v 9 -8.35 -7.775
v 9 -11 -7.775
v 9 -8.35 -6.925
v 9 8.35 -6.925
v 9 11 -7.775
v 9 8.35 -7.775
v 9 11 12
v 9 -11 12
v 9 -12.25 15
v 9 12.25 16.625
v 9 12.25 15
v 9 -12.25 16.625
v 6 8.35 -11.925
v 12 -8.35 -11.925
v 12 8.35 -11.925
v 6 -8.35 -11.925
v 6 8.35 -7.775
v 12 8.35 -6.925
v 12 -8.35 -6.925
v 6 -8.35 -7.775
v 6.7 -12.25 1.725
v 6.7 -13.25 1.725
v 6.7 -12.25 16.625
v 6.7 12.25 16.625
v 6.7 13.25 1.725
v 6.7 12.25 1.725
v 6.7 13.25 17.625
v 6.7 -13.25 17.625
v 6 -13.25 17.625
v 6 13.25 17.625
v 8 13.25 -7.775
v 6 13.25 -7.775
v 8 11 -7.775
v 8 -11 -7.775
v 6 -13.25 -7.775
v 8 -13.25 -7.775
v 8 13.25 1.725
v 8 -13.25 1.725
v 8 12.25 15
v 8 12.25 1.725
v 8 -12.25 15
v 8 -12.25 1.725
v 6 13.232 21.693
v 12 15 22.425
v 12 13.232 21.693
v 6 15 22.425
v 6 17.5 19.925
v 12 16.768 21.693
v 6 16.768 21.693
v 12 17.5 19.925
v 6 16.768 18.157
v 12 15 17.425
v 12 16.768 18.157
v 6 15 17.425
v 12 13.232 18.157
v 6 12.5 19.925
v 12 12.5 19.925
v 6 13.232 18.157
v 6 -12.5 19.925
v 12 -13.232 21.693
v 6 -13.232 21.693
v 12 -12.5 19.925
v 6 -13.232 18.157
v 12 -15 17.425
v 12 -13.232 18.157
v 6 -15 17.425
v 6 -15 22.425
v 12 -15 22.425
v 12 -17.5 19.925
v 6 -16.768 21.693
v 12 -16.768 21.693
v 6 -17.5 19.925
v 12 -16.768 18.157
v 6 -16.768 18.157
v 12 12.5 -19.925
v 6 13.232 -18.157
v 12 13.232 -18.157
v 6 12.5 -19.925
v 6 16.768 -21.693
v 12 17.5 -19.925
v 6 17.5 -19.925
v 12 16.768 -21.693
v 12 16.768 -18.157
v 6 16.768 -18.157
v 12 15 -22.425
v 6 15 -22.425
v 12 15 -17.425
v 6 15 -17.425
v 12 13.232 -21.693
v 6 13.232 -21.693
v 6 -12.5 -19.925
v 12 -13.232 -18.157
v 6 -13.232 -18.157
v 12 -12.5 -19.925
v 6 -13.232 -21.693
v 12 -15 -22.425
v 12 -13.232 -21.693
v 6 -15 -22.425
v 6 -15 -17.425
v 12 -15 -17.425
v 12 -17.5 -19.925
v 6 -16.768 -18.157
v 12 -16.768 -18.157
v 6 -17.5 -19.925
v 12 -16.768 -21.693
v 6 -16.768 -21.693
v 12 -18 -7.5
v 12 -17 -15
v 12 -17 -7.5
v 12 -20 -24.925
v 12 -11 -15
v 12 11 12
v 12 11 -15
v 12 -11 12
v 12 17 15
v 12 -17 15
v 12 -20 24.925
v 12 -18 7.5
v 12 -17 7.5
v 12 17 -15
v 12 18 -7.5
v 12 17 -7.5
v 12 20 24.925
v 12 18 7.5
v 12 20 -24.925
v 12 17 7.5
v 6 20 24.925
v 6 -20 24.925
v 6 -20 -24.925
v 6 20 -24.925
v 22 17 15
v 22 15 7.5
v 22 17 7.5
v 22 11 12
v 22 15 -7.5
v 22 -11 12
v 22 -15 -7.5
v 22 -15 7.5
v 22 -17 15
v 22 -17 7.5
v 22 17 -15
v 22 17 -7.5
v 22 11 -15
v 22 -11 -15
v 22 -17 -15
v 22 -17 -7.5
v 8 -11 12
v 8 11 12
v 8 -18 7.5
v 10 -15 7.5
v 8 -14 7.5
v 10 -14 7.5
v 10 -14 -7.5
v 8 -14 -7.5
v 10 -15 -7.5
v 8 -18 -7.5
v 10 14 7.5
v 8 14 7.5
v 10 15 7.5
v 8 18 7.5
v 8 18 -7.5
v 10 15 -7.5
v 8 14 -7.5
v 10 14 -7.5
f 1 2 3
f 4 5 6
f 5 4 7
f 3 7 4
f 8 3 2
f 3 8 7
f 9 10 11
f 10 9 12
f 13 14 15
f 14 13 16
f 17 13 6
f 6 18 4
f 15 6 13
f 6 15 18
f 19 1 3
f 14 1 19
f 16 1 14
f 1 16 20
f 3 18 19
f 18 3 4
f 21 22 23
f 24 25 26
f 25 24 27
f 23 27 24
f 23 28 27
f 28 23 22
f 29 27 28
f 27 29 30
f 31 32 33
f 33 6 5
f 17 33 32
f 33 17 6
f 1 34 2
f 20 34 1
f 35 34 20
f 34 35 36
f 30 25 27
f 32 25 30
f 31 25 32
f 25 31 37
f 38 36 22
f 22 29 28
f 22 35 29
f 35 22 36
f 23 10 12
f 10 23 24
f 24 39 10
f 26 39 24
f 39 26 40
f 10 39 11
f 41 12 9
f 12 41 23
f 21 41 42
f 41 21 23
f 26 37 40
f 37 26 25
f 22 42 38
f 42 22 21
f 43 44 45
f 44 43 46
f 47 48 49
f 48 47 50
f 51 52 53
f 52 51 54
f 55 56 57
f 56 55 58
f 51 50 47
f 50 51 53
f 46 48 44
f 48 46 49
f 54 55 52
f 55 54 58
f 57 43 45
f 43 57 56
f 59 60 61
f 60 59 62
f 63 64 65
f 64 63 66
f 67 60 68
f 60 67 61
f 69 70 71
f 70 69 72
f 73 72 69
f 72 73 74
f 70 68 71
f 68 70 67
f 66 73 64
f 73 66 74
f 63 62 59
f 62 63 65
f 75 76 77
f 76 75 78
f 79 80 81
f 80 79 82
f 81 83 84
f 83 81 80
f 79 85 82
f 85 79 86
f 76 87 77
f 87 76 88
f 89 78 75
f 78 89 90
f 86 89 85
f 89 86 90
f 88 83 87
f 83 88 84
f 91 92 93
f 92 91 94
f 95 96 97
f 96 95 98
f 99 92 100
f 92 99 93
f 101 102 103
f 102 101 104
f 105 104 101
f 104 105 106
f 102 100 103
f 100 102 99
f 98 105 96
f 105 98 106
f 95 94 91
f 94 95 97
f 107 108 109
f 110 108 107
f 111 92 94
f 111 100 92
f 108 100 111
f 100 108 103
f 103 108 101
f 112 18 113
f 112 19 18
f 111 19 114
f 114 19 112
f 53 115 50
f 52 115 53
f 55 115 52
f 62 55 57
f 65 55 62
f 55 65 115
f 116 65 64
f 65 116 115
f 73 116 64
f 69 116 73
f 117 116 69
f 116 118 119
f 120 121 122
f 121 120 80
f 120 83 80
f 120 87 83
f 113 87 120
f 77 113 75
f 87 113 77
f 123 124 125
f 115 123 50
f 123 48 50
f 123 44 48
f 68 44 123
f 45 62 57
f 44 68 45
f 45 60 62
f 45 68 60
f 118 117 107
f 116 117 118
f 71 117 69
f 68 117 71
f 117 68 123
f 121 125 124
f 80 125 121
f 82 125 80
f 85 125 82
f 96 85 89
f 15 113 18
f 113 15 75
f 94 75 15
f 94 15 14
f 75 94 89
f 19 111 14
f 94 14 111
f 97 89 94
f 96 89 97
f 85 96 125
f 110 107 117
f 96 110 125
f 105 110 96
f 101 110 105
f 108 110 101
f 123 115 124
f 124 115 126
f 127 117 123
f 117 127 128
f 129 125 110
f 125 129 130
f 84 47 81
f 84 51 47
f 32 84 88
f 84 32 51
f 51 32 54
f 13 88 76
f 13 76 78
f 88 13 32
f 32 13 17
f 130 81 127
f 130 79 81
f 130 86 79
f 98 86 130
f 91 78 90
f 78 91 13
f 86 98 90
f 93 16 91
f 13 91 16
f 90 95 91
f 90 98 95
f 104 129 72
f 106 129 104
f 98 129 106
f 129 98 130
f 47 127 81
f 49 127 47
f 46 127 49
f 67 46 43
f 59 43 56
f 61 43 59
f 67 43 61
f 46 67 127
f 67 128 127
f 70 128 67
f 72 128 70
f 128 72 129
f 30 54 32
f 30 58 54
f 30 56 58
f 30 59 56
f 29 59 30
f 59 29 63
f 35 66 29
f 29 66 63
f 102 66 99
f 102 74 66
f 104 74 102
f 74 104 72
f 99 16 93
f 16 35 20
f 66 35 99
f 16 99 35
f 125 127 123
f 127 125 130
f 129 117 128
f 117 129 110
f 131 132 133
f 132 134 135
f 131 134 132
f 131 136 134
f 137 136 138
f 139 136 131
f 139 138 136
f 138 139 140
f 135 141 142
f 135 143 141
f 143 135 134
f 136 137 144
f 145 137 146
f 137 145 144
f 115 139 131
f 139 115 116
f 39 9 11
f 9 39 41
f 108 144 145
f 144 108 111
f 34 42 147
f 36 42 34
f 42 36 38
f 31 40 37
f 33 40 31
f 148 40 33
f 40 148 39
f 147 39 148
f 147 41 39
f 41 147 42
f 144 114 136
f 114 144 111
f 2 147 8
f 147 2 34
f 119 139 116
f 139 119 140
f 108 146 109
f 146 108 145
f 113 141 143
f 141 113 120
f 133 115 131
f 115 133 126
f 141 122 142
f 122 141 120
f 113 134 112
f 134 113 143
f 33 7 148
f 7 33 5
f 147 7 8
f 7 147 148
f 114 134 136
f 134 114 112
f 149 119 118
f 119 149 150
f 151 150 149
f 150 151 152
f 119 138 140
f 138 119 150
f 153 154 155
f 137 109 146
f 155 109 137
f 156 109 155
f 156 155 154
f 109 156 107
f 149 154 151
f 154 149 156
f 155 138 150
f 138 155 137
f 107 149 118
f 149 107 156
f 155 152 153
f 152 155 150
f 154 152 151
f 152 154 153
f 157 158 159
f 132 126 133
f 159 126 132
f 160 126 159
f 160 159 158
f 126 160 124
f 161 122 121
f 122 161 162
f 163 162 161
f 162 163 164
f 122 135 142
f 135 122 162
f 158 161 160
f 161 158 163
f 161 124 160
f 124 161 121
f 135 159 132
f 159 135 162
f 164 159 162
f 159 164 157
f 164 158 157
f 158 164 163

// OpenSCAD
// file: PiCameraMount.scad
/*
 * openSCAD for a simple mount for the Raspberry PI Camera Module
 *
 * This file is not for standalone use - it's included in to another
 * openSCAN file for including in to another model.
 *
 * Copyright 2015 Peter T Mount
 * 
 * Licensed under the Apache License, Version 2.0 (the "License");
 * you may not use this file except in compliance with the License.
 * You may obtain a copy of the License at
 * 
 * http://www.apache.org/licenses/LICENSE-2.0
 * 
 * Unless required by applicable law or agreed to in writing, software
 * distributed under the License is distributed on an "AS IS" BASIS,
 * WITHOUT WARRANTIES OR CONDITIONS OF ANY KIND, either express or implied.
 * See the License for the specific language governing permissions and
 * limitations under the License.
 *
 */

// Uncomment this line to render/print just the holder as-is.
// Leave it commented out so that this file can be included in other modules
//piCameraStandalone(50);

/*
 * Measured dimensions of a PI Camera Module.
 *
 * These are based on actual measurements and those manually measured by Gert van Loo
 * and published on Scribd:
 *
 *		http://www.scribd.com/doc/142718448/Raspberry-Pi-Camera-Mechanical-Data
 *
 * Width & Depth are the exterior dimensions, width being the edge with the ribbon.
 *
 * We add 1.5 to these to give some room and account for the printer as it seems
 * to give a better fit.
 *
 * y offset is the height from the bottom of the center of the camera lens.
 *
 * ribbon width is just that, if required
 */
piCameraWidth=25 +1.5;
piCameraDepth=23.9 +1.5;
piCameraRibbonWidth=16.2 +0.5;
piCameraLensSize=8 +1.5;
piCameraYOffset=5.1+(piCameraLensSize/2);

/*
 * Module to render a PI camera mount.
 *
 * To use translate it into the required position so that the camera lens
 * is at the origin & pointing along the x axis.
 *
 * Then call piCameraMount(radius,mode)
 *
 * Where:
 *		width	the width of the component
 *		mode	The mode of the render
 *
 * The width must be >30mm as it's used to include the mounting hardware.
 * However you can enlarge it.
 *
 * The mode defines how it's rendered:
 *		0	Render the front panel
 *		1	Render the back panel
 *		2	Render a plain panel with just the mounting holes
 *    3	As 1 but cable exit on back is internal rather than at the bottom of the plate
 */

module piCamera(width,mode) {
	assign(
		tubeRadius=width/2,
		piCameraLensHalf=piCameraLensSize/2,
		piCameraWHalf=piCameraWidth/2,
		piCameraDHalf=piCameraDepth/2,
		offset=piCameraYOffset
	) {
		translate([0,0,piCameraYOffset/2]) union() {
			// Front panel
			difference() {
				if(mode==1 || mode==3)
					translate([6,-tubeRadius,-tubeRadius-offset]) cube([6,width,width+offset]);
				else
					translate([0,-tubeRadius,-tubeRadius-offset]) cube([6,width,width+offset]);

//				translate([4,-tubeRadius-1,-tubeRadius-offset-1]) cube([2,width+2,width+offset+2]);

				if(mode!=2) {
					// Holder for the pi camera module
					translate([4.5,-piCameraWHalf,-piCameraDHalf])
						cube([2.2,piCameraWidth,piCameraDepth]);

					// Holder for components on rear of module
					translate([6,1-piCameraWHalf,1-piCameraDHalf])
						cube([3,piCameraWidth-2,piCameraDepth-2]);
					translate([6,-piCameraWHalf,-piCameraDHalf])
						cube([3,piCameraWidth,9.5]);

					// Hole for the camera lens
					translate([-0.5,-piCameraLensHalf,2-piCameraLensSize])
						cube([6,piCameraLensSize,piCameraLensSize]);

					// Indent for ribbon holder on front of the module
					translate([2.5,-piCameraLensSize*2/3,-0.5])
						cube([3,piCameraLensSize*4/3,piCameraDHalf+1]);
		
					// Space for ribbon cable
					if(mode==1)
						translate([ 5, -piCameraRibbonWidth/2,-tubeRadius-1-offset])
							cube([3,piCameraRibbonWidth,tubeRadius+1+offset]);
					else if(mode==3) {
						translate([ 5, -piCameraRibbonWidth/2,14-tubeRadius-1-offset])
							cube([4,piCameraRibbonWidth,15]);
						translate([ 5, -piCameraRibbonWidth/2,14-tubeRadius-1-offset])
							cube([10,piCameraRibbonWidth,5]);
					}
				}

				// M4 mounting holes
				piCameraHoles(width,15);
			}
		}

	}
}

module piCameraHoles(width,h) {
	assign(tubeRadius=width/2) {
		for(h=[0:3])
			translate([-1,
				(h%2) ? (-tubeRadius+5) : (tubeRadius-5),
				(floor(h/2)) ? (-tubeRadius+5-piCameraYOffset) : (tubeRadius-5)
			])
			rotate([0,90,0])
			cylinder(h=15,r=2.5);
	}
}

/*
 * Standalone, generate a model of just the camera module with the specified radius
 */
module piCameraStandalone(radius) {
	translate([6,0,0]) rotate([0,0,180]) piCamera(radius,0);
	translate([-6,-radius*3/2,0]) piCamera(radius,3);
}
// file: Common.scad
/*
 * openSCAD Common features
 *
 * This file is not for standalone use - it's included in to another
 * openSCAN file for including in to another model.
 *
 * Copyright 2015 Peter T Mount
 * 
 * Licensed under the Apache License, Version 2.0 (the "License");
 * you may not use this file except in compliance with the License.
 * You may obtain a copy of the License at
 * 
 * http://www.apache.org/licenses/LICENSE-2.0
 * 
 * Unless required by applicable law or agreed to in writing, software
 * distributed under the License is distributed on an "AS IS" BASIS,
 * WITHOUT WARRANTIES OR CONDITIONS OF ANY KIND, either express or implied.
 * See the License for the specific language governing permissions and
 * limitations under the License.
 *
 */

/*
 * Bolt sizes - these are for the holes hence +0.25mm, measurements in radius
 */
M4=2.25;
M5=2.75;
M6=3.25;
// main file
/*
 * openSCAD for the movable Sky Camera for the Mark II weather station.
 *
 * The idea of this camera is this:
 *
 * 1 The camera will be mounted within a dummy dome security camera,
 *   pointing upwards.
 * 2 It will be mounted on a 2 axis servo camera mount.
 *   This will be oriented so it will give a 180 view east to west.
 *
 * These are optional, if there is room in the camera dome.
 * 3 A 3D printed mount for this camera will polar align it.
 * 4 On top will be a 2x lens servo controlled so we can have 1x & 2x
 * 5 On top will be a solar filter, servo controlled.
 * 
 * Copyright 2015 Peter T Mount
 * 
 * Licensed under the Apache License, Version 2.0 (the "License");
 * you may not use this file except in compliance with the License.
 * You may obtain a copy of the License at
 * 
 * http://www.apache.org/licenses/LICENSE-2.0
 * 
 * Unless required by applicable law or agreed to in writing, software
 * distributed under the License is distributed on an "AS IS" BASIS,
 * WITHOUT WARRANTIES OR CONDITIONS OF ANY KIND, either express or implied.
 * See the License for the specific language governing permissions and
 * limitations under the License.
 *
 */

// Include the telescope mount in the model
includeFront=0;

// Include the backplate in the model
includeBack=1;

includeFilter=0;

// ======================================================================
// Do not modify these

include <Common.scad>
include <PiCameraMount.scad>

// Camera mount specs
// width/height of inside the mounting
mountSize=30;
mountHalf=mountSize/2;

// Height of the 2 side forks
mountFork=15;

// Camera mount
width=40;

// Servo dimensions
servoWidth=13;
servoHeight=24;
// Offset is from top to center of servo shaft
servoOffset=5.5;
// Depth from flange to base
servoDepth=17;
// Height from base of flange to top (not including shaft)
servoTop=11;

// **********************************************************************
if(includeFront) front();
if(includeBack) back();
if(includeFilter) filter();

// **********************************************************************

// Filter wheel mount
module filter() {
	filterServo();
}

module filterServo() {
	translate([-6,0,0])
	difference() {
		// Camera mount + Servo mount
		union() {
			piCamera(width,2);
			translate([0,-width/2,(width+piCameraYOffset)/2])
				cube([5,width,20]);
		translate([0,-servoOffset-servoHeight/2,5+(width+piCameraYOffset)/2]) servo();
		}
		// Light path to camera
		translate([-1,0,piCameraYOffset/4])
			rotate([0,90,0]) 
			cylinder( h=24,r=12);
		// Servo mount
	}
}

// A servo. In reality used to cut out the servo from items
module servo() {
	translate([-servoTop,0,0]) union() {
		// The body - aka the hole for it
		cube([servoDepth+servoTop,servoHeight,servoWidth]);
		// The shaft
		rotate([0,90,0])
			translate([-servoOffset-1,servoHeight-servoOffset,-4])
			cylinder(h=4,r=2);
	}
}

// Camera mount front
module front() {
	piCamera(width,0);
}

// Camer mount back with fixing to the pan & tilt mount
module back() {
	difference() {
		union() {
			piCamera(width,3);
			translate([8,-mountHalf-2,-mountHalf]) cube([mountFork-1,6,mountSize]);
			translate([8,mountHalf-4,-mountHalf]) cube([mountFork-1,6,mountSize]);
			translate([8,-mountHalf,12]) cube([mountFork-1,mountSize,3]);
		}
		translate([5,0,0]) cameramount();
	}
}

// The camera mount - used to remove from the backing
module cameramount() {
	union() {
		translate([3,-mountHalf-3,-mountHalf/2]) cube([mountFork,3,mountFork]);
		translate([3,-mountHalf-1,-mountHalf/2]) cube([2,2,mountFork]);
		translate([3,mountHalf,-mountHalf/2]) cube([mountFork,3,mountFork]);
		translate([3,mountHalf-1,-mountHalf/2]) cube([2,2,mountFork]);
		translate([mountFork+3,-mountHalf-3,-mountHalf]) cube([2,mountSize+6,mountSize]);
	}
}
